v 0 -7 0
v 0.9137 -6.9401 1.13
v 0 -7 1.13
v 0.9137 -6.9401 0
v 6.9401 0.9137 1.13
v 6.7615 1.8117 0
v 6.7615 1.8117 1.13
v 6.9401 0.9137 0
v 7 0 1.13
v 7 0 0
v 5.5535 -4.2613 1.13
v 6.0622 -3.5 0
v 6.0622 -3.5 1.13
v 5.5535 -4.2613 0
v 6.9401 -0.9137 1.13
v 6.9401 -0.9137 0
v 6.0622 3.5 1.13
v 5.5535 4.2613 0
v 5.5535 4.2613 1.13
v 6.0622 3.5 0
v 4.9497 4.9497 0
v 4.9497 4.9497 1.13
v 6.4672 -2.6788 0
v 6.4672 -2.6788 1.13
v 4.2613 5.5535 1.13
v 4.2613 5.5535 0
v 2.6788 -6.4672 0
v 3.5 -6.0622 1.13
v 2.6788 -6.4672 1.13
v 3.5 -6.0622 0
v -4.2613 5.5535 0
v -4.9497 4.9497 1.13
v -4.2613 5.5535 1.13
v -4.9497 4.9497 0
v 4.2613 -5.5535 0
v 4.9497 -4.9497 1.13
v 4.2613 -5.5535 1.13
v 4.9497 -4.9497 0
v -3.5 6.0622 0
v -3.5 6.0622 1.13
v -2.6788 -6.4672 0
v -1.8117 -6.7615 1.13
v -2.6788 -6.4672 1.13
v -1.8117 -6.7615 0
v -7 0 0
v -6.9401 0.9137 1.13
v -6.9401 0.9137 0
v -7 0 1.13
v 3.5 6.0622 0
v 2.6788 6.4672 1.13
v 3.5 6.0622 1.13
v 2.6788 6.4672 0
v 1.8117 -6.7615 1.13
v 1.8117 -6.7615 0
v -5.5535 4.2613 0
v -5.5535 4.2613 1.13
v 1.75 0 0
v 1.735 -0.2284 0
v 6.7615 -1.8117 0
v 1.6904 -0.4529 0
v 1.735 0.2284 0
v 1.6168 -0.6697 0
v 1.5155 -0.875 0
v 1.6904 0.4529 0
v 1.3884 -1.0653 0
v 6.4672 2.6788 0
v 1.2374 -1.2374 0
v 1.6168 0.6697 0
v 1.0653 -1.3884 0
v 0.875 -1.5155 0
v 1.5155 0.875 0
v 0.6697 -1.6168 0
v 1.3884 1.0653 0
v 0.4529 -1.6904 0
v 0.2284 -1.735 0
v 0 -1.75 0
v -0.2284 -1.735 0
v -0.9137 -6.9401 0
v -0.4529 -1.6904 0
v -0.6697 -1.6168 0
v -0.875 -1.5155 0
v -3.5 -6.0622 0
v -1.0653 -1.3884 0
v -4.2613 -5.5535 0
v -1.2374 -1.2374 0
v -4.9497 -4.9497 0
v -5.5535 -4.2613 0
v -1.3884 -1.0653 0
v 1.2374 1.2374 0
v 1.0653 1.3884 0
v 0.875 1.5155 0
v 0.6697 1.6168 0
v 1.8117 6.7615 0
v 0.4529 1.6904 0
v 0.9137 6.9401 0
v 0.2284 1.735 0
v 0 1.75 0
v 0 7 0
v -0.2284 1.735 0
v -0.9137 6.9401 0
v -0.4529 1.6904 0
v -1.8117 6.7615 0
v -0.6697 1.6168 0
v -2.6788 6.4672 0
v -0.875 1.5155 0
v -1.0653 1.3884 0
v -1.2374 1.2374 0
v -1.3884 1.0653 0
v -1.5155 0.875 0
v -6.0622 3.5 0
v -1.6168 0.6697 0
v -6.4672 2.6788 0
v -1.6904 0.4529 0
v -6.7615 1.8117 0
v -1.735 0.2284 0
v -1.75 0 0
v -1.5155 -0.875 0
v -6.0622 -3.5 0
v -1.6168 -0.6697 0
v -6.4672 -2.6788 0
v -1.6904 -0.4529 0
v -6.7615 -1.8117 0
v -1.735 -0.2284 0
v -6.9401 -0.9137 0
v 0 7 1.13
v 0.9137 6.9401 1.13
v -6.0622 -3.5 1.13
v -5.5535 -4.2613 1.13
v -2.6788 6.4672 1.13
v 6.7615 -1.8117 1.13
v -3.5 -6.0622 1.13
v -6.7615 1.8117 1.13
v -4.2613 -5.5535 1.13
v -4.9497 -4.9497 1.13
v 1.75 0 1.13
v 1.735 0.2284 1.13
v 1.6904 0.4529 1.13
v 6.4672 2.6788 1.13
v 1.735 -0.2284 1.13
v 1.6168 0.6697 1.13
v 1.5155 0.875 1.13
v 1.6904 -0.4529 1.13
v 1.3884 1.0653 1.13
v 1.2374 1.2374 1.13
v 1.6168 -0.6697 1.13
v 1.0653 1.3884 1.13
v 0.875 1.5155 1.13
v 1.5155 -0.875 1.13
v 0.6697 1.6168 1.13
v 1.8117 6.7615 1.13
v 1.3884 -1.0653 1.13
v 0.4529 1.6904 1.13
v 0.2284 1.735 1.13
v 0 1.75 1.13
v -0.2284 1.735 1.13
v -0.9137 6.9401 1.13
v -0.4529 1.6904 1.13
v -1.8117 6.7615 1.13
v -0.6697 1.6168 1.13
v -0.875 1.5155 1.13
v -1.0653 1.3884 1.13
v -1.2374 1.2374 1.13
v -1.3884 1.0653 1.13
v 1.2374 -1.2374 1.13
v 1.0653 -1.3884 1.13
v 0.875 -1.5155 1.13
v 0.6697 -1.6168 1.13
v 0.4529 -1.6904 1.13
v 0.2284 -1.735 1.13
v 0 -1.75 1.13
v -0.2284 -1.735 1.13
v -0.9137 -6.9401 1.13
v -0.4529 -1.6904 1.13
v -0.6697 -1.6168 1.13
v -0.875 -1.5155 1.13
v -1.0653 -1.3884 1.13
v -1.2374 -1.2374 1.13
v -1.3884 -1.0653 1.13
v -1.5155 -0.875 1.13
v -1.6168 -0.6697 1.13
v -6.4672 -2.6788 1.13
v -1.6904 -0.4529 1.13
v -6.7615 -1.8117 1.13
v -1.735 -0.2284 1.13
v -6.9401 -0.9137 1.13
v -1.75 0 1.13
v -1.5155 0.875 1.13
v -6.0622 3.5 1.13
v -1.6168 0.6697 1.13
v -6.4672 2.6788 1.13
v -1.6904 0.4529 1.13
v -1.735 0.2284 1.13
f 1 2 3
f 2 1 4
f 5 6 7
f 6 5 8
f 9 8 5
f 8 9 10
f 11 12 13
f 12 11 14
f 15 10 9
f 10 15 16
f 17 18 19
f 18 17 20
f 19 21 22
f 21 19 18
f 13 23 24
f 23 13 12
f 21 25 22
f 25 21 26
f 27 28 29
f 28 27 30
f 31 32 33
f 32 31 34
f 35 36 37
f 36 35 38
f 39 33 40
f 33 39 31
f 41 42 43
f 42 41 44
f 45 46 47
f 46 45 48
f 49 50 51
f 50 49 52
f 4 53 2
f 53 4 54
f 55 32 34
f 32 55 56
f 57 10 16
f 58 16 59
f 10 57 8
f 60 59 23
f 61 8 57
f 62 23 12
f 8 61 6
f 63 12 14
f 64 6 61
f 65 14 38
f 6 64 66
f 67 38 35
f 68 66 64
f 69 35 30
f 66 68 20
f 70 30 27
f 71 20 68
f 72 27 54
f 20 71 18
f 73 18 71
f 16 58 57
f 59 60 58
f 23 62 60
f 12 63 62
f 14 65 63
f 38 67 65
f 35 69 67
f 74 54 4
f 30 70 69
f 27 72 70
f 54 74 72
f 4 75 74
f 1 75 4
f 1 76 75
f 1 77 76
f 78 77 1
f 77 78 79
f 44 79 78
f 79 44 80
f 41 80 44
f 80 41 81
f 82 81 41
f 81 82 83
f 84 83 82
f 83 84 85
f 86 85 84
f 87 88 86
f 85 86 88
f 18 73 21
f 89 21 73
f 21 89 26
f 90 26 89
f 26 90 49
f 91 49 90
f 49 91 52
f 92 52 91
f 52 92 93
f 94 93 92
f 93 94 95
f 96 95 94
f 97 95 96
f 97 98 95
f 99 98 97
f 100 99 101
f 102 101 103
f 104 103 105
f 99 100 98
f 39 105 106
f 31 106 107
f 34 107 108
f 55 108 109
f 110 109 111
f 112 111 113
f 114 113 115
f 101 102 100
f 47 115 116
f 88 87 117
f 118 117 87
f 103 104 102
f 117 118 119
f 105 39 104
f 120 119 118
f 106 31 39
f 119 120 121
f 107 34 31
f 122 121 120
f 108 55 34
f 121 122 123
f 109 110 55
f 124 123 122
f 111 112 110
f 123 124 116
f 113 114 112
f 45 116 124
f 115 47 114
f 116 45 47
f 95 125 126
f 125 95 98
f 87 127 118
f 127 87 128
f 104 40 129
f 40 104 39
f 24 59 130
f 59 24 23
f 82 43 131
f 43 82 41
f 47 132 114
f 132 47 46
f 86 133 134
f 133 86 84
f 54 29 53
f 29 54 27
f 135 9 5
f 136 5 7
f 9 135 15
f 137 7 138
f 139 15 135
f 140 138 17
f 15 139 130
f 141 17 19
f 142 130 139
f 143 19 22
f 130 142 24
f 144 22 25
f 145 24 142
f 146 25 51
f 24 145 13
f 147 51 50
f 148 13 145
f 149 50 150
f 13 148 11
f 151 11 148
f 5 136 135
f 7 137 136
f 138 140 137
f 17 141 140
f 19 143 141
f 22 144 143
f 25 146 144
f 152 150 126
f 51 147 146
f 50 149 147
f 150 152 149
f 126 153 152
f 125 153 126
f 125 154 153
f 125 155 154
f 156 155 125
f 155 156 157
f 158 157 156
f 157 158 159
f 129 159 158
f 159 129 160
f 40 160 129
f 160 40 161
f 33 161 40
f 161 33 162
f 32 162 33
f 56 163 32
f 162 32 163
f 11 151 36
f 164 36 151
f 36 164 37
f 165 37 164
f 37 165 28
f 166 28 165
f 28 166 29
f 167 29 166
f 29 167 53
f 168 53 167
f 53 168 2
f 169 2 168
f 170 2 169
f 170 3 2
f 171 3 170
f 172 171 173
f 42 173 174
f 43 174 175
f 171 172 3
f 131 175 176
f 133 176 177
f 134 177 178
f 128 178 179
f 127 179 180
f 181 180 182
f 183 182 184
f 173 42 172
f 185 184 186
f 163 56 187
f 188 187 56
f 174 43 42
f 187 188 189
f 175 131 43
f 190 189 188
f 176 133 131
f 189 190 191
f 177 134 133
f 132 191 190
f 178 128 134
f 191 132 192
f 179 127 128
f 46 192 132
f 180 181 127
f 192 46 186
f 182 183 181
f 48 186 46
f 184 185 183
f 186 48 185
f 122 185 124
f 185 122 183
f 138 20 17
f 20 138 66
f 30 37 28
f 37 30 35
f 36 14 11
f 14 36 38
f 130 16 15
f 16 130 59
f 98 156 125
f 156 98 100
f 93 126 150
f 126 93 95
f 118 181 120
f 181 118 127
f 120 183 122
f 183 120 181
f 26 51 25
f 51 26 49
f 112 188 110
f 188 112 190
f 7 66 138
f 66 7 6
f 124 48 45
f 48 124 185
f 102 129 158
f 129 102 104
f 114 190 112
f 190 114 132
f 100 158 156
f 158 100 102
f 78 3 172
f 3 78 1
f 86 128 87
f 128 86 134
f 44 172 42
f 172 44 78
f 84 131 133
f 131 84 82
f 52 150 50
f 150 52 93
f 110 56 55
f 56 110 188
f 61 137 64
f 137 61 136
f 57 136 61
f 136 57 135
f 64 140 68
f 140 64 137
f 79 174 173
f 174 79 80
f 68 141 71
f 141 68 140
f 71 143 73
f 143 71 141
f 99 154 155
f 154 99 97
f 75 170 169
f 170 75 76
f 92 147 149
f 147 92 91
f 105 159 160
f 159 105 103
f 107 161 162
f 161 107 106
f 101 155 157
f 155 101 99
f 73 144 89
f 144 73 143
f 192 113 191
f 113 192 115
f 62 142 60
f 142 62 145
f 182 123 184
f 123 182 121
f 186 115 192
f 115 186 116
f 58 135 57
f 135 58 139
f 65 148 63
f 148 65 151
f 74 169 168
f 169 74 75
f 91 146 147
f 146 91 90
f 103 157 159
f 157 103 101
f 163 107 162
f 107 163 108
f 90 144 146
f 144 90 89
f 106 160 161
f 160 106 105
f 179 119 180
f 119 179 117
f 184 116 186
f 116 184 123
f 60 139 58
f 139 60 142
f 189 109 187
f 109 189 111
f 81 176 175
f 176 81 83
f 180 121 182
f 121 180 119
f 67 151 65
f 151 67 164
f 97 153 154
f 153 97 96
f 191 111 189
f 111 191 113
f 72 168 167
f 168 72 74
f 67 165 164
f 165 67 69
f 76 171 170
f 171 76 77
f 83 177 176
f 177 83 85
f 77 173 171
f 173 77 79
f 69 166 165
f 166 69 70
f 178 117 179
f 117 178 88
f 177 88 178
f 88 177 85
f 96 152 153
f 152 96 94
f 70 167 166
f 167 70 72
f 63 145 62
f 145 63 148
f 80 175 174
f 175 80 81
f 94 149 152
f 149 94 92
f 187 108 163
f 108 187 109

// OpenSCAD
// file: parameters.scad
// =============================================================================
// Gen-AN Dual-rotor copper-centroid hyper AFPM - WOUND-AWARE (HARD GATE)
// PRIMARY challenger vs Gen-AK. Magnets @ R=39.5 + 200 t + former_web 1.30 -> m2m 4.76.
// =============================================================================

// --- Wire / wind budget (26 AWG, ~1 lb spool ~ 390 m bare-equiv) --------------
wire_awg            = 26;
wire_od             = 0.45;     // insulated OD mm
turns               = 200;      // +10 vs Gen-AK 190
fill                = 0.70;
layers_per_face     = 2;        // axial layers proud of EACH flange
wind_build_axial    = layers_per_face * wire_od * fill;   // 0.63 mm
wind_build_radial   = 3 * wire_od * fill;                 // 0.945 mm

// --- Pancake former (bare STL) -----------------------------------------------
coil_id_r           = 15.5;     // copper-centroid window centered ~R=39.5
coil_od_r           = 63.5;
span_deg            = 26.0;     // 12 stations x 30 deg pitch
former_web          = 1.30;     // thinner vs AK 1.40 (print-safe >=1.30)
flange_t            = 0.60;
wall                = 1.2;
slot_w              = 2.4;
mount_hole          = 3.5;
tab_len             = 7.0;

former_bare_h       = former_web + 2 * flange_t;            // 2.50 mm
coil_envelope_h     = former_bare_h + 2 * wind_build_axial; // 3.76 mm

// --- Running clearance (magnet face -> WOUND face) EACH side ------------------
run_clear           = 0.50;     // PASS floor >= 0.5
gap_spacer_h        = run_clear + wind_build_axial;         // 1.13 mm
m2m                 = coil_envelope_h + 2 * run_clear;      // 4.76 mm (beats Gen-AK 4.86)

// --- Mid stator (12 pancakes 3ph; winds proud both faces) ---------------------
coil_stations       = 12;
bay_r_in            = coil_id_r - 2.0 - wind_build_radial;
bay_r_out           = coil_od_r + 2.0 + wind_build_radial;
bay_span            = span_deg + 4.0;
bay_offset          = 2.0;
stator_thick        = former_bare_h;                        // winds proud +/-Z
stator_od           = 160.0;
shaft_clear_stator  = 34.0;
coil_mount_r        = 25.5;

// --- Rotors (x2) - 8xO20 @ R=39.5 (copper centroid) + 24xO5 Halbach ----------
large_pocket_d      = 20.3;
small_pocket_d      = 5.3;
pocket_h            = 5.2;
large_n             = 8;
R_large             = 39.5;     // covers ~29.5-49.5 over copper centroid ~39.5
R_small_inner       = 24.5;
R_small_mid         = 39.5;
R_small_outer       = 56.5;
carrier_od          = 156.0;
carrier_thick       = 7.5;
hub_h               = 10.0;
hub_od              = 30.0;
rotor_b_offset_deg  = 22.5;

// --- Modular MAX interface (Gen-E family) ------------------------------------
shaft_bore          = 8.35;
bearing_d           = 21.85;
bearing_h           = 7.2;
m3_clear            = 3.5;
bolt_r_inner        = 36.0;
bolt_n_inner        = 6;
flange_bolt_r       = 72.0;
flange_bolt_n       = 6;
brace_r             = 68.0;
brace_d             = 4.3;
brace_n             = 4;

spacer_pad_od       = 14.0;
spacer_pad_id       = m3_clear;
endbell_od          = 160.0;
endbell_thick       = 8.0;
endbell_shaft_clear = 10.0;

$fn = 64;
// main file
// Gen-AN gap spacer — h = run_clear + wind_build_axial
include <parameters.scad>;
$fn = 48;
difference() {
    cylinder(d=spacer_pad_od, h=gap_spacer_h);
    translate([0, 0, -0.1]) cylinder(d=spacer_pad_id, h=gap_spacer_h + 0.2);
}
